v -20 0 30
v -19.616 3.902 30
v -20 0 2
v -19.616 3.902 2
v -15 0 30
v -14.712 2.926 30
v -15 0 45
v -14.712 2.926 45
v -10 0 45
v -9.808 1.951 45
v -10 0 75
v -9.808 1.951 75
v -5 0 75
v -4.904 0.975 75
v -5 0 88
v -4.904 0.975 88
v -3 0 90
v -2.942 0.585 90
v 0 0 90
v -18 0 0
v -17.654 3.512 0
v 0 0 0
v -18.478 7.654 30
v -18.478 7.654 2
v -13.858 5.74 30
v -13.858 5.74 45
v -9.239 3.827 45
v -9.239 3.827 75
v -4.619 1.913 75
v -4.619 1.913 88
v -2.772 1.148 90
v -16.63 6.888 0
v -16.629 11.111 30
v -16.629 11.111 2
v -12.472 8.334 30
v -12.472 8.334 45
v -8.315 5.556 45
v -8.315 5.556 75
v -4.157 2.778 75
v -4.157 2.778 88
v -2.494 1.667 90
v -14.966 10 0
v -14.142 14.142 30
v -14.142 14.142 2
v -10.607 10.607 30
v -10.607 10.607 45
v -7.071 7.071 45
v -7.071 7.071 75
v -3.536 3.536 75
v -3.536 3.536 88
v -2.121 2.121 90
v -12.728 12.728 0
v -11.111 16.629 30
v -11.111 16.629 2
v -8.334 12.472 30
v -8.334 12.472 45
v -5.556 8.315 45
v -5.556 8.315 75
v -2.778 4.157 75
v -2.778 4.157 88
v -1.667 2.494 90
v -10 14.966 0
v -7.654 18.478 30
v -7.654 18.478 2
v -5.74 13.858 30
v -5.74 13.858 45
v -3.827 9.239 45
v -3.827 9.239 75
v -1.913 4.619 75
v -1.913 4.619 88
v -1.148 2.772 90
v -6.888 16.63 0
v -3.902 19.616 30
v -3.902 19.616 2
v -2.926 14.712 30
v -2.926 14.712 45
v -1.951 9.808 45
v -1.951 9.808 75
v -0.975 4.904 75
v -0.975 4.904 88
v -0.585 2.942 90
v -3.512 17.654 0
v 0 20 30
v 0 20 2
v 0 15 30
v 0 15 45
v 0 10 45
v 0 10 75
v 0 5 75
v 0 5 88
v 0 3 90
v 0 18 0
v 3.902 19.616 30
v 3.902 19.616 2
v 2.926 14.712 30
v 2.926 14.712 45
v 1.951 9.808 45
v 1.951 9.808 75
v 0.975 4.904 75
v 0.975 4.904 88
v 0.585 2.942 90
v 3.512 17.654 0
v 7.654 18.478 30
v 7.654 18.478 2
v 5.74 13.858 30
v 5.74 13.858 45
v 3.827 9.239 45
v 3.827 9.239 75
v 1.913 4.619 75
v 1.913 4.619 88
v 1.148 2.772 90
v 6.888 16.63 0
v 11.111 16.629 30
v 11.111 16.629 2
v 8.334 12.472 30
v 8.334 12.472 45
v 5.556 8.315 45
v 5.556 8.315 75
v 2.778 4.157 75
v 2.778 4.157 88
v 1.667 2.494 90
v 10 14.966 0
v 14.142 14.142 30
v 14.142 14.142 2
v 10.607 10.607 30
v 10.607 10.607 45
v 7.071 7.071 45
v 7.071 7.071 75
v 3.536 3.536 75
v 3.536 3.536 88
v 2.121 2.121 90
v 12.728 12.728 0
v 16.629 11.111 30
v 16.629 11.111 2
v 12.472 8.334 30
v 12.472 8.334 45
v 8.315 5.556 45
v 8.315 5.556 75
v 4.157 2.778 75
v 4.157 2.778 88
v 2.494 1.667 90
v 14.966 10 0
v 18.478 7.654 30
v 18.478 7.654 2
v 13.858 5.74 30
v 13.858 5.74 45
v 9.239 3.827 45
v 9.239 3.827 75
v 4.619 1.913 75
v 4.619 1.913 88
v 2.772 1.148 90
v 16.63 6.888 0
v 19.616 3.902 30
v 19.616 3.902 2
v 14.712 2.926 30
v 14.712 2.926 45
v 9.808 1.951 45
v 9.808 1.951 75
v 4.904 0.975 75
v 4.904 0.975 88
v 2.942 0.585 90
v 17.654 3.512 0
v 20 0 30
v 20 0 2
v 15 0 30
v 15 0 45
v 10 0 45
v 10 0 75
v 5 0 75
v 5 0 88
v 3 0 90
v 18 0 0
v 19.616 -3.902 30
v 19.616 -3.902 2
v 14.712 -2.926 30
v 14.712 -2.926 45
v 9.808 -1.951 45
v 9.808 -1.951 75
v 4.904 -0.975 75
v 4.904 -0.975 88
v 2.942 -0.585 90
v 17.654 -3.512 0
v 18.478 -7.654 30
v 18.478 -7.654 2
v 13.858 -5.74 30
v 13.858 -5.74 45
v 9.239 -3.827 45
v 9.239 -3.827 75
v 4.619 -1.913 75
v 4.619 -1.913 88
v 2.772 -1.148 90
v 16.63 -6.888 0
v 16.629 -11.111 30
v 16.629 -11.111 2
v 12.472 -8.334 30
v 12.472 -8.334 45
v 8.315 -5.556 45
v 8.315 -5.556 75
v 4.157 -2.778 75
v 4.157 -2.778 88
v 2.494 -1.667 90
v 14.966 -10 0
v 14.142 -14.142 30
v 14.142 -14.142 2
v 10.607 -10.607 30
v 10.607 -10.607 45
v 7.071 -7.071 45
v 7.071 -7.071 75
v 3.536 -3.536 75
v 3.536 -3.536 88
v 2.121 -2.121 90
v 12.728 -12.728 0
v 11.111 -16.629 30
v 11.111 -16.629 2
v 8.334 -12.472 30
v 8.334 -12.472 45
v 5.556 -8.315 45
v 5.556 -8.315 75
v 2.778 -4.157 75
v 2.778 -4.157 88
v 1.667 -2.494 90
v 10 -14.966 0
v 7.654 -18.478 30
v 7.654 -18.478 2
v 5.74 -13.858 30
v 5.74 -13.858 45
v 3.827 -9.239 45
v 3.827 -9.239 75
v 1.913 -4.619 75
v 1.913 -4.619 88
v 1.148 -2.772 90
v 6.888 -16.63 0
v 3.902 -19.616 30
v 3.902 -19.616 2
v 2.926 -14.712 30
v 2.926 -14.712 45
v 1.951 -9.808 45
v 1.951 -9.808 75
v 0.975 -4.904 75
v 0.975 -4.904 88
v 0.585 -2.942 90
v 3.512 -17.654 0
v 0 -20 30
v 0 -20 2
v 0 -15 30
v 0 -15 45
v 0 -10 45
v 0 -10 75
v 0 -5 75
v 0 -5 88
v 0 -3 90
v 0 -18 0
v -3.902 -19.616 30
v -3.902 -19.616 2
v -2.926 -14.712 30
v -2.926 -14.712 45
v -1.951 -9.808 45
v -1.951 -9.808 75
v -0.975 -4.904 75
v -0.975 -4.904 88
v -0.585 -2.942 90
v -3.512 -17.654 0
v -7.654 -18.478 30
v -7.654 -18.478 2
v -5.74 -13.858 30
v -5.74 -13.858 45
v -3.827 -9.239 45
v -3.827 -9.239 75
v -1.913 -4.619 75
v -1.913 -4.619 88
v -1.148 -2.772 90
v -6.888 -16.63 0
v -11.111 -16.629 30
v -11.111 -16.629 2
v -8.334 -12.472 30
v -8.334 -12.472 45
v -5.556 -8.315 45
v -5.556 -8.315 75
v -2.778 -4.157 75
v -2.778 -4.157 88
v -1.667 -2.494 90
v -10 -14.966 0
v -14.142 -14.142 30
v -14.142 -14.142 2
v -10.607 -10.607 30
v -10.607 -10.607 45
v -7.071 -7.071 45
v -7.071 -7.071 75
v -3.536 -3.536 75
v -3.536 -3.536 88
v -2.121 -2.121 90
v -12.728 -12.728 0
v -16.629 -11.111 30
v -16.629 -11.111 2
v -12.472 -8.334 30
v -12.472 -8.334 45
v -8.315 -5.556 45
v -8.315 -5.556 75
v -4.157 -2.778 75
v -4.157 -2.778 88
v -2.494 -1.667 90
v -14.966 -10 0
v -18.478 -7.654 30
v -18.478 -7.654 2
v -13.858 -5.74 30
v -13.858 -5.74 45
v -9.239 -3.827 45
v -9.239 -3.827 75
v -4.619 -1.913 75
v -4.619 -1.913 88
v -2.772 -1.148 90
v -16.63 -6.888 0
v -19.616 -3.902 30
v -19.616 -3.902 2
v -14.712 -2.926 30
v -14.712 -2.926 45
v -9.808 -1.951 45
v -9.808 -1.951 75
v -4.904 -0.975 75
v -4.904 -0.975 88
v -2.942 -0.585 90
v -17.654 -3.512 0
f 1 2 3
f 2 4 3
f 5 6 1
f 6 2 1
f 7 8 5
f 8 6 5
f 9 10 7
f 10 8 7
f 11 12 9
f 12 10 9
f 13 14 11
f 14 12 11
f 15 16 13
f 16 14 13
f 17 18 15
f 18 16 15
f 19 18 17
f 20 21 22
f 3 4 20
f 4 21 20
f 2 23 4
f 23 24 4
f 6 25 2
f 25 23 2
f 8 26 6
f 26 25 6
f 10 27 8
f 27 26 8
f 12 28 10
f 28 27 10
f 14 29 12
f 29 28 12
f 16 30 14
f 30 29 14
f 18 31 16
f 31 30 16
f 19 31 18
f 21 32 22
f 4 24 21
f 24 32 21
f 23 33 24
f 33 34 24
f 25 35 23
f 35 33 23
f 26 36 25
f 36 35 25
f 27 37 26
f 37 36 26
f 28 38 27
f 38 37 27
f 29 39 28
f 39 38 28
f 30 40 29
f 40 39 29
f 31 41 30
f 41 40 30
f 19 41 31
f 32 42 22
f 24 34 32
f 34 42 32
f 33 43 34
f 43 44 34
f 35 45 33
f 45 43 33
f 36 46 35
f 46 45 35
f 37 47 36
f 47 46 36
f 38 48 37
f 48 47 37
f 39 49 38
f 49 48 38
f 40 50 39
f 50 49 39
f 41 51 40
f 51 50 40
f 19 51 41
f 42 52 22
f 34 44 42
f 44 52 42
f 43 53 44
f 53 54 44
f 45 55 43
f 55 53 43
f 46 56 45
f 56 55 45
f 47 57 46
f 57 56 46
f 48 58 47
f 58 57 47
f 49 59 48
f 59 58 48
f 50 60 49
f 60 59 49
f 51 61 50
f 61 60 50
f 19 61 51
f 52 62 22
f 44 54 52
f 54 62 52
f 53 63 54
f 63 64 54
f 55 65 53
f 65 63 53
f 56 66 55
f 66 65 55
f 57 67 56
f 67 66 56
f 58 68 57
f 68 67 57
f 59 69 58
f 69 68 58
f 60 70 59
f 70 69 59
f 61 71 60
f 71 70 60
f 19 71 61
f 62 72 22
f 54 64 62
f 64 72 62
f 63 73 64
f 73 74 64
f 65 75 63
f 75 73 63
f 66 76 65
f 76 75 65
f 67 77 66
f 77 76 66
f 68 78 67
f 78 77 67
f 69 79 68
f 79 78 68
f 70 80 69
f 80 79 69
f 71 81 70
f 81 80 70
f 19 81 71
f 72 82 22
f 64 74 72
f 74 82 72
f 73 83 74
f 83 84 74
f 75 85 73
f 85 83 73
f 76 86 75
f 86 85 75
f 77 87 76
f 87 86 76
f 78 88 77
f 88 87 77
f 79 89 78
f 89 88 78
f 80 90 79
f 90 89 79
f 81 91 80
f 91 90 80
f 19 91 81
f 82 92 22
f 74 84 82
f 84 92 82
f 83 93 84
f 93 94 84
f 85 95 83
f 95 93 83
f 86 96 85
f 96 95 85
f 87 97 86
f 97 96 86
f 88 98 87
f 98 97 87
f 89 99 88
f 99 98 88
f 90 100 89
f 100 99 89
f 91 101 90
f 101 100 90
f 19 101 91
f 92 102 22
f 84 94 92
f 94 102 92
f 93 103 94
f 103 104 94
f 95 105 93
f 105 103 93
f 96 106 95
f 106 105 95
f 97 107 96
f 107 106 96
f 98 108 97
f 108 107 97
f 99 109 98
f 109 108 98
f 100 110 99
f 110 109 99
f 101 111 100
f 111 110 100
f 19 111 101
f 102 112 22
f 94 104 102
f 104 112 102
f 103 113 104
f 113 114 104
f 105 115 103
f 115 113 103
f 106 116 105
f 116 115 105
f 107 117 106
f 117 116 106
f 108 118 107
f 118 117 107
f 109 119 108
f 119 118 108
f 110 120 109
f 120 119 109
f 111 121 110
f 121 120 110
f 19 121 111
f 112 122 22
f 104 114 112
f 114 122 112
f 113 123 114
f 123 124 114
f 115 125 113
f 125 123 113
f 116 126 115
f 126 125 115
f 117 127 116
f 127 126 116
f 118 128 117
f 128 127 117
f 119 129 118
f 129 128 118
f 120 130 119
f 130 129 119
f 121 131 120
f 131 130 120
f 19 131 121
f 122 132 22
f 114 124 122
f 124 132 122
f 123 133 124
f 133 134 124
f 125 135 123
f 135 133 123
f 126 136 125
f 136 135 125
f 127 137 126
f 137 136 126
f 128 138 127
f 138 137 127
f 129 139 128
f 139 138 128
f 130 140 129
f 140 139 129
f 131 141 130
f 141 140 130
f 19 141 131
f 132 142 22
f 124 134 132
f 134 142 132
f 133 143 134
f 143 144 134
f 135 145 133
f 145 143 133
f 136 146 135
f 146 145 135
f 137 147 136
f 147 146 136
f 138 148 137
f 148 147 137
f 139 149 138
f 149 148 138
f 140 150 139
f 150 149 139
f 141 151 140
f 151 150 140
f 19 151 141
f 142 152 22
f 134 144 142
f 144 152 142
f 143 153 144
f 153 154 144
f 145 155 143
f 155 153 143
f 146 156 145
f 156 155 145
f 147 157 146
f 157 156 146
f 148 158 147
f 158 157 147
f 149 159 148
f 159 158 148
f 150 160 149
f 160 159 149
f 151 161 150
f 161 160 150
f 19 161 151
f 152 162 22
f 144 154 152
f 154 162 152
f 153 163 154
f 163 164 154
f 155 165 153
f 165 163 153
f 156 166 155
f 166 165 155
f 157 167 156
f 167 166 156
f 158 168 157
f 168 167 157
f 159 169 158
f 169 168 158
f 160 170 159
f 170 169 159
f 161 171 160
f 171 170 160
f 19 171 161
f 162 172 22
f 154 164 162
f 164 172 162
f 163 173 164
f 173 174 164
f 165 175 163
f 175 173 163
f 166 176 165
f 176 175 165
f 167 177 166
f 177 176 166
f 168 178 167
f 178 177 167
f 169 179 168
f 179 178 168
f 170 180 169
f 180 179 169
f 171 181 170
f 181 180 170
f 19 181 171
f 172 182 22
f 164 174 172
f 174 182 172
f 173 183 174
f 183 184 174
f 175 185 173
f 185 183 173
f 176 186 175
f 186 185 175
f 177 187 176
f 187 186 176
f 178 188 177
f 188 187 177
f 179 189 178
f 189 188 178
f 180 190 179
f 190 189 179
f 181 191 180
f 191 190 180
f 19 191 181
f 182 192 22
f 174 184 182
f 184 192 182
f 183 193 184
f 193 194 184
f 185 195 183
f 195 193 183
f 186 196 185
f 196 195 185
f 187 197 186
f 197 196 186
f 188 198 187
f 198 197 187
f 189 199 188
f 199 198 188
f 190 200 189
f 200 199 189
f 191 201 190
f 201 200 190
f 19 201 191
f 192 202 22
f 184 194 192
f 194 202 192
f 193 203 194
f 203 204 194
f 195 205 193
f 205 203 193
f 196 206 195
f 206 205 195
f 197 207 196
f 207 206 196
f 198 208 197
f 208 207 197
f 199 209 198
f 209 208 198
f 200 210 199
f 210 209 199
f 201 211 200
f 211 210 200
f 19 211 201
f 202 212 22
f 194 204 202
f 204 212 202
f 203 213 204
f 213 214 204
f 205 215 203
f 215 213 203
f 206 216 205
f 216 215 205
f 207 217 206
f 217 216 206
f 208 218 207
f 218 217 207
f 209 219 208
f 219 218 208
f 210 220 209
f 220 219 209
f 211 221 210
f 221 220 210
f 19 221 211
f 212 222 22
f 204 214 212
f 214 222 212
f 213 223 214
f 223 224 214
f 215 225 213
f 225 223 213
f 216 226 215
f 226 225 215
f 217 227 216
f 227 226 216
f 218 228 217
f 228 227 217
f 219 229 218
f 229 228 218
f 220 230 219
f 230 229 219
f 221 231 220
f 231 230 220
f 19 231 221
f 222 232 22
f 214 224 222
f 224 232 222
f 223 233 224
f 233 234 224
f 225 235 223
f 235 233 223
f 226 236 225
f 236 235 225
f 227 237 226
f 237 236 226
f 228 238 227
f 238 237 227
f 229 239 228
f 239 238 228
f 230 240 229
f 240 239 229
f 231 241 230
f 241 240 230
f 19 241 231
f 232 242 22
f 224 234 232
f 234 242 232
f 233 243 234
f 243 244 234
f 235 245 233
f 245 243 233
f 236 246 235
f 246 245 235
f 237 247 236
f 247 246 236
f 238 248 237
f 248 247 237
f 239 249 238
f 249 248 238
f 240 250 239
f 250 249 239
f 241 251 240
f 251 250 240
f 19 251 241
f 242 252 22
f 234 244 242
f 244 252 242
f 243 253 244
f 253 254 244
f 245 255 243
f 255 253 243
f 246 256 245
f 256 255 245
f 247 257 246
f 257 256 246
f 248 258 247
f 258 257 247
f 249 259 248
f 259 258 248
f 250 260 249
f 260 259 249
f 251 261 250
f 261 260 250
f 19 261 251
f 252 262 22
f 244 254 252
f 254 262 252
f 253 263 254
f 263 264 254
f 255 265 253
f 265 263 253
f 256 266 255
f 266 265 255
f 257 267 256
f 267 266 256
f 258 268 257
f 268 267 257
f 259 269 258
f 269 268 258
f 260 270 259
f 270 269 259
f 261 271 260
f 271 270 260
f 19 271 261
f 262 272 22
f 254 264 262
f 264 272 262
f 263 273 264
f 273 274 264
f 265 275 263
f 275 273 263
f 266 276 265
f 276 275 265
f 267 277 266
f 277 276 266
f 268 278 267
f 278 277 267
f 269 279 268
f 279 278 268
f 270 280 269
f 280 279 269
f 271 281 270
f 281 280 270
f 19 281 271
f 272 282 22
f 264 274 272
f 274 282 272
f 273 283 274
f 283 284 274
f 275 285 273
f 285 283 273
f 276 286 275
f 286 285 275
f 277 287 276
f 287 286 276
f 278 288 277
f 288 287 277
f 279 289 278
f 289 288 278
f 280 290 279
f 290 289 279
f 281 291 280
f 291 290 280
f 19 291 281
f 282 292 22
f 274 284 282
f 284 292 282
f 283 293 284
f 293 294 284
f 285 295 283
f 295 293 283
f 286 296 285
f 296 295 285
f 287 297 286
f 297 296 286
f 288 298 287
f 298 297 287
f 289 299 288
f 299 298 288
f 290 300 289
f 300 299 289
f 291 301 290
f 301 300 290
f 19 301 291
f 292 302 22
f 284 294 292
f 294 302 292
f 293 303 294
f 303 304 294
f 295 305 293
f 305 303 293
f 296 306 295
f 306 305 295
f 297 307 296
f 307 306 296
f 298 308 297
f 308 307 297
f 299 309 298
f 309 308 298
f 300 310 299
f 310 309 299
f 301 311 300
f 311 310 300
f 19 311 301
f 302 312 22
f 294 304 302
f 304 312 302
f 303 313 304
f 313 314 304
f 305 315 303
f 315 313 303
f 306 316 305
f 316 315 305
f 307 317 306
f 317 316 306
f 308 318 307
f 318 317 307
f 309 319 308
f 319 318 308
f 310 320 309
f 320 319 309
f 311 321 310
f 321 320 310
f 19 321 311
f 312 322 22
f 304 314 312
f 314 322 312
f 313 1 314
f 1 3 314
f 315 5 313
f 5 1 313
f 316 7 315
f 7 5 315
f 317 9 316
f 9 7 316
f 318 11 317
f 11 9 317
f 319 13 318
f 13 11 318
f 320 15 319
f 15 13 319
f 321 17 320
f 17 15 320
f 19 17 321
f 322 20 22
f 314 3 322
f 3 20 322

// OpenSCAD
$fn = 32;

// ----------------------------------------------------------------------
// Stepped shaft: diameters 40, 30, 20, 10 mm, 90 mm long
// ----------------------------------------------------------------------

// --- parameters (mm) ---
d1 = 40;                  // step 1 diameter
len1 = 30;                // step 1 length
d2 = 30;                  // step 2 diameter
len2 = 15;                // step 2 length
d3 = 20;                  // step 3 diameter
len3 = 30;                // step 3 length
d4 = 10;                  // step 4 diameter
len4 = 15;                // step 4 length
total = 90;               // overall length
chamfer = 2;              // end chamfer

/* closed turning profile: x is the radius, y is the length */
profile = [[0, 0], [20 - chamfer, 0], [20, chamfer], [20, 30], [15, 30], [15, 45], [10, 45], [10, 75], [5, 75], [5, 88], [3, 90], [0, 90]];

difference() {
  rotate_extrude() polygon(profile);
}
